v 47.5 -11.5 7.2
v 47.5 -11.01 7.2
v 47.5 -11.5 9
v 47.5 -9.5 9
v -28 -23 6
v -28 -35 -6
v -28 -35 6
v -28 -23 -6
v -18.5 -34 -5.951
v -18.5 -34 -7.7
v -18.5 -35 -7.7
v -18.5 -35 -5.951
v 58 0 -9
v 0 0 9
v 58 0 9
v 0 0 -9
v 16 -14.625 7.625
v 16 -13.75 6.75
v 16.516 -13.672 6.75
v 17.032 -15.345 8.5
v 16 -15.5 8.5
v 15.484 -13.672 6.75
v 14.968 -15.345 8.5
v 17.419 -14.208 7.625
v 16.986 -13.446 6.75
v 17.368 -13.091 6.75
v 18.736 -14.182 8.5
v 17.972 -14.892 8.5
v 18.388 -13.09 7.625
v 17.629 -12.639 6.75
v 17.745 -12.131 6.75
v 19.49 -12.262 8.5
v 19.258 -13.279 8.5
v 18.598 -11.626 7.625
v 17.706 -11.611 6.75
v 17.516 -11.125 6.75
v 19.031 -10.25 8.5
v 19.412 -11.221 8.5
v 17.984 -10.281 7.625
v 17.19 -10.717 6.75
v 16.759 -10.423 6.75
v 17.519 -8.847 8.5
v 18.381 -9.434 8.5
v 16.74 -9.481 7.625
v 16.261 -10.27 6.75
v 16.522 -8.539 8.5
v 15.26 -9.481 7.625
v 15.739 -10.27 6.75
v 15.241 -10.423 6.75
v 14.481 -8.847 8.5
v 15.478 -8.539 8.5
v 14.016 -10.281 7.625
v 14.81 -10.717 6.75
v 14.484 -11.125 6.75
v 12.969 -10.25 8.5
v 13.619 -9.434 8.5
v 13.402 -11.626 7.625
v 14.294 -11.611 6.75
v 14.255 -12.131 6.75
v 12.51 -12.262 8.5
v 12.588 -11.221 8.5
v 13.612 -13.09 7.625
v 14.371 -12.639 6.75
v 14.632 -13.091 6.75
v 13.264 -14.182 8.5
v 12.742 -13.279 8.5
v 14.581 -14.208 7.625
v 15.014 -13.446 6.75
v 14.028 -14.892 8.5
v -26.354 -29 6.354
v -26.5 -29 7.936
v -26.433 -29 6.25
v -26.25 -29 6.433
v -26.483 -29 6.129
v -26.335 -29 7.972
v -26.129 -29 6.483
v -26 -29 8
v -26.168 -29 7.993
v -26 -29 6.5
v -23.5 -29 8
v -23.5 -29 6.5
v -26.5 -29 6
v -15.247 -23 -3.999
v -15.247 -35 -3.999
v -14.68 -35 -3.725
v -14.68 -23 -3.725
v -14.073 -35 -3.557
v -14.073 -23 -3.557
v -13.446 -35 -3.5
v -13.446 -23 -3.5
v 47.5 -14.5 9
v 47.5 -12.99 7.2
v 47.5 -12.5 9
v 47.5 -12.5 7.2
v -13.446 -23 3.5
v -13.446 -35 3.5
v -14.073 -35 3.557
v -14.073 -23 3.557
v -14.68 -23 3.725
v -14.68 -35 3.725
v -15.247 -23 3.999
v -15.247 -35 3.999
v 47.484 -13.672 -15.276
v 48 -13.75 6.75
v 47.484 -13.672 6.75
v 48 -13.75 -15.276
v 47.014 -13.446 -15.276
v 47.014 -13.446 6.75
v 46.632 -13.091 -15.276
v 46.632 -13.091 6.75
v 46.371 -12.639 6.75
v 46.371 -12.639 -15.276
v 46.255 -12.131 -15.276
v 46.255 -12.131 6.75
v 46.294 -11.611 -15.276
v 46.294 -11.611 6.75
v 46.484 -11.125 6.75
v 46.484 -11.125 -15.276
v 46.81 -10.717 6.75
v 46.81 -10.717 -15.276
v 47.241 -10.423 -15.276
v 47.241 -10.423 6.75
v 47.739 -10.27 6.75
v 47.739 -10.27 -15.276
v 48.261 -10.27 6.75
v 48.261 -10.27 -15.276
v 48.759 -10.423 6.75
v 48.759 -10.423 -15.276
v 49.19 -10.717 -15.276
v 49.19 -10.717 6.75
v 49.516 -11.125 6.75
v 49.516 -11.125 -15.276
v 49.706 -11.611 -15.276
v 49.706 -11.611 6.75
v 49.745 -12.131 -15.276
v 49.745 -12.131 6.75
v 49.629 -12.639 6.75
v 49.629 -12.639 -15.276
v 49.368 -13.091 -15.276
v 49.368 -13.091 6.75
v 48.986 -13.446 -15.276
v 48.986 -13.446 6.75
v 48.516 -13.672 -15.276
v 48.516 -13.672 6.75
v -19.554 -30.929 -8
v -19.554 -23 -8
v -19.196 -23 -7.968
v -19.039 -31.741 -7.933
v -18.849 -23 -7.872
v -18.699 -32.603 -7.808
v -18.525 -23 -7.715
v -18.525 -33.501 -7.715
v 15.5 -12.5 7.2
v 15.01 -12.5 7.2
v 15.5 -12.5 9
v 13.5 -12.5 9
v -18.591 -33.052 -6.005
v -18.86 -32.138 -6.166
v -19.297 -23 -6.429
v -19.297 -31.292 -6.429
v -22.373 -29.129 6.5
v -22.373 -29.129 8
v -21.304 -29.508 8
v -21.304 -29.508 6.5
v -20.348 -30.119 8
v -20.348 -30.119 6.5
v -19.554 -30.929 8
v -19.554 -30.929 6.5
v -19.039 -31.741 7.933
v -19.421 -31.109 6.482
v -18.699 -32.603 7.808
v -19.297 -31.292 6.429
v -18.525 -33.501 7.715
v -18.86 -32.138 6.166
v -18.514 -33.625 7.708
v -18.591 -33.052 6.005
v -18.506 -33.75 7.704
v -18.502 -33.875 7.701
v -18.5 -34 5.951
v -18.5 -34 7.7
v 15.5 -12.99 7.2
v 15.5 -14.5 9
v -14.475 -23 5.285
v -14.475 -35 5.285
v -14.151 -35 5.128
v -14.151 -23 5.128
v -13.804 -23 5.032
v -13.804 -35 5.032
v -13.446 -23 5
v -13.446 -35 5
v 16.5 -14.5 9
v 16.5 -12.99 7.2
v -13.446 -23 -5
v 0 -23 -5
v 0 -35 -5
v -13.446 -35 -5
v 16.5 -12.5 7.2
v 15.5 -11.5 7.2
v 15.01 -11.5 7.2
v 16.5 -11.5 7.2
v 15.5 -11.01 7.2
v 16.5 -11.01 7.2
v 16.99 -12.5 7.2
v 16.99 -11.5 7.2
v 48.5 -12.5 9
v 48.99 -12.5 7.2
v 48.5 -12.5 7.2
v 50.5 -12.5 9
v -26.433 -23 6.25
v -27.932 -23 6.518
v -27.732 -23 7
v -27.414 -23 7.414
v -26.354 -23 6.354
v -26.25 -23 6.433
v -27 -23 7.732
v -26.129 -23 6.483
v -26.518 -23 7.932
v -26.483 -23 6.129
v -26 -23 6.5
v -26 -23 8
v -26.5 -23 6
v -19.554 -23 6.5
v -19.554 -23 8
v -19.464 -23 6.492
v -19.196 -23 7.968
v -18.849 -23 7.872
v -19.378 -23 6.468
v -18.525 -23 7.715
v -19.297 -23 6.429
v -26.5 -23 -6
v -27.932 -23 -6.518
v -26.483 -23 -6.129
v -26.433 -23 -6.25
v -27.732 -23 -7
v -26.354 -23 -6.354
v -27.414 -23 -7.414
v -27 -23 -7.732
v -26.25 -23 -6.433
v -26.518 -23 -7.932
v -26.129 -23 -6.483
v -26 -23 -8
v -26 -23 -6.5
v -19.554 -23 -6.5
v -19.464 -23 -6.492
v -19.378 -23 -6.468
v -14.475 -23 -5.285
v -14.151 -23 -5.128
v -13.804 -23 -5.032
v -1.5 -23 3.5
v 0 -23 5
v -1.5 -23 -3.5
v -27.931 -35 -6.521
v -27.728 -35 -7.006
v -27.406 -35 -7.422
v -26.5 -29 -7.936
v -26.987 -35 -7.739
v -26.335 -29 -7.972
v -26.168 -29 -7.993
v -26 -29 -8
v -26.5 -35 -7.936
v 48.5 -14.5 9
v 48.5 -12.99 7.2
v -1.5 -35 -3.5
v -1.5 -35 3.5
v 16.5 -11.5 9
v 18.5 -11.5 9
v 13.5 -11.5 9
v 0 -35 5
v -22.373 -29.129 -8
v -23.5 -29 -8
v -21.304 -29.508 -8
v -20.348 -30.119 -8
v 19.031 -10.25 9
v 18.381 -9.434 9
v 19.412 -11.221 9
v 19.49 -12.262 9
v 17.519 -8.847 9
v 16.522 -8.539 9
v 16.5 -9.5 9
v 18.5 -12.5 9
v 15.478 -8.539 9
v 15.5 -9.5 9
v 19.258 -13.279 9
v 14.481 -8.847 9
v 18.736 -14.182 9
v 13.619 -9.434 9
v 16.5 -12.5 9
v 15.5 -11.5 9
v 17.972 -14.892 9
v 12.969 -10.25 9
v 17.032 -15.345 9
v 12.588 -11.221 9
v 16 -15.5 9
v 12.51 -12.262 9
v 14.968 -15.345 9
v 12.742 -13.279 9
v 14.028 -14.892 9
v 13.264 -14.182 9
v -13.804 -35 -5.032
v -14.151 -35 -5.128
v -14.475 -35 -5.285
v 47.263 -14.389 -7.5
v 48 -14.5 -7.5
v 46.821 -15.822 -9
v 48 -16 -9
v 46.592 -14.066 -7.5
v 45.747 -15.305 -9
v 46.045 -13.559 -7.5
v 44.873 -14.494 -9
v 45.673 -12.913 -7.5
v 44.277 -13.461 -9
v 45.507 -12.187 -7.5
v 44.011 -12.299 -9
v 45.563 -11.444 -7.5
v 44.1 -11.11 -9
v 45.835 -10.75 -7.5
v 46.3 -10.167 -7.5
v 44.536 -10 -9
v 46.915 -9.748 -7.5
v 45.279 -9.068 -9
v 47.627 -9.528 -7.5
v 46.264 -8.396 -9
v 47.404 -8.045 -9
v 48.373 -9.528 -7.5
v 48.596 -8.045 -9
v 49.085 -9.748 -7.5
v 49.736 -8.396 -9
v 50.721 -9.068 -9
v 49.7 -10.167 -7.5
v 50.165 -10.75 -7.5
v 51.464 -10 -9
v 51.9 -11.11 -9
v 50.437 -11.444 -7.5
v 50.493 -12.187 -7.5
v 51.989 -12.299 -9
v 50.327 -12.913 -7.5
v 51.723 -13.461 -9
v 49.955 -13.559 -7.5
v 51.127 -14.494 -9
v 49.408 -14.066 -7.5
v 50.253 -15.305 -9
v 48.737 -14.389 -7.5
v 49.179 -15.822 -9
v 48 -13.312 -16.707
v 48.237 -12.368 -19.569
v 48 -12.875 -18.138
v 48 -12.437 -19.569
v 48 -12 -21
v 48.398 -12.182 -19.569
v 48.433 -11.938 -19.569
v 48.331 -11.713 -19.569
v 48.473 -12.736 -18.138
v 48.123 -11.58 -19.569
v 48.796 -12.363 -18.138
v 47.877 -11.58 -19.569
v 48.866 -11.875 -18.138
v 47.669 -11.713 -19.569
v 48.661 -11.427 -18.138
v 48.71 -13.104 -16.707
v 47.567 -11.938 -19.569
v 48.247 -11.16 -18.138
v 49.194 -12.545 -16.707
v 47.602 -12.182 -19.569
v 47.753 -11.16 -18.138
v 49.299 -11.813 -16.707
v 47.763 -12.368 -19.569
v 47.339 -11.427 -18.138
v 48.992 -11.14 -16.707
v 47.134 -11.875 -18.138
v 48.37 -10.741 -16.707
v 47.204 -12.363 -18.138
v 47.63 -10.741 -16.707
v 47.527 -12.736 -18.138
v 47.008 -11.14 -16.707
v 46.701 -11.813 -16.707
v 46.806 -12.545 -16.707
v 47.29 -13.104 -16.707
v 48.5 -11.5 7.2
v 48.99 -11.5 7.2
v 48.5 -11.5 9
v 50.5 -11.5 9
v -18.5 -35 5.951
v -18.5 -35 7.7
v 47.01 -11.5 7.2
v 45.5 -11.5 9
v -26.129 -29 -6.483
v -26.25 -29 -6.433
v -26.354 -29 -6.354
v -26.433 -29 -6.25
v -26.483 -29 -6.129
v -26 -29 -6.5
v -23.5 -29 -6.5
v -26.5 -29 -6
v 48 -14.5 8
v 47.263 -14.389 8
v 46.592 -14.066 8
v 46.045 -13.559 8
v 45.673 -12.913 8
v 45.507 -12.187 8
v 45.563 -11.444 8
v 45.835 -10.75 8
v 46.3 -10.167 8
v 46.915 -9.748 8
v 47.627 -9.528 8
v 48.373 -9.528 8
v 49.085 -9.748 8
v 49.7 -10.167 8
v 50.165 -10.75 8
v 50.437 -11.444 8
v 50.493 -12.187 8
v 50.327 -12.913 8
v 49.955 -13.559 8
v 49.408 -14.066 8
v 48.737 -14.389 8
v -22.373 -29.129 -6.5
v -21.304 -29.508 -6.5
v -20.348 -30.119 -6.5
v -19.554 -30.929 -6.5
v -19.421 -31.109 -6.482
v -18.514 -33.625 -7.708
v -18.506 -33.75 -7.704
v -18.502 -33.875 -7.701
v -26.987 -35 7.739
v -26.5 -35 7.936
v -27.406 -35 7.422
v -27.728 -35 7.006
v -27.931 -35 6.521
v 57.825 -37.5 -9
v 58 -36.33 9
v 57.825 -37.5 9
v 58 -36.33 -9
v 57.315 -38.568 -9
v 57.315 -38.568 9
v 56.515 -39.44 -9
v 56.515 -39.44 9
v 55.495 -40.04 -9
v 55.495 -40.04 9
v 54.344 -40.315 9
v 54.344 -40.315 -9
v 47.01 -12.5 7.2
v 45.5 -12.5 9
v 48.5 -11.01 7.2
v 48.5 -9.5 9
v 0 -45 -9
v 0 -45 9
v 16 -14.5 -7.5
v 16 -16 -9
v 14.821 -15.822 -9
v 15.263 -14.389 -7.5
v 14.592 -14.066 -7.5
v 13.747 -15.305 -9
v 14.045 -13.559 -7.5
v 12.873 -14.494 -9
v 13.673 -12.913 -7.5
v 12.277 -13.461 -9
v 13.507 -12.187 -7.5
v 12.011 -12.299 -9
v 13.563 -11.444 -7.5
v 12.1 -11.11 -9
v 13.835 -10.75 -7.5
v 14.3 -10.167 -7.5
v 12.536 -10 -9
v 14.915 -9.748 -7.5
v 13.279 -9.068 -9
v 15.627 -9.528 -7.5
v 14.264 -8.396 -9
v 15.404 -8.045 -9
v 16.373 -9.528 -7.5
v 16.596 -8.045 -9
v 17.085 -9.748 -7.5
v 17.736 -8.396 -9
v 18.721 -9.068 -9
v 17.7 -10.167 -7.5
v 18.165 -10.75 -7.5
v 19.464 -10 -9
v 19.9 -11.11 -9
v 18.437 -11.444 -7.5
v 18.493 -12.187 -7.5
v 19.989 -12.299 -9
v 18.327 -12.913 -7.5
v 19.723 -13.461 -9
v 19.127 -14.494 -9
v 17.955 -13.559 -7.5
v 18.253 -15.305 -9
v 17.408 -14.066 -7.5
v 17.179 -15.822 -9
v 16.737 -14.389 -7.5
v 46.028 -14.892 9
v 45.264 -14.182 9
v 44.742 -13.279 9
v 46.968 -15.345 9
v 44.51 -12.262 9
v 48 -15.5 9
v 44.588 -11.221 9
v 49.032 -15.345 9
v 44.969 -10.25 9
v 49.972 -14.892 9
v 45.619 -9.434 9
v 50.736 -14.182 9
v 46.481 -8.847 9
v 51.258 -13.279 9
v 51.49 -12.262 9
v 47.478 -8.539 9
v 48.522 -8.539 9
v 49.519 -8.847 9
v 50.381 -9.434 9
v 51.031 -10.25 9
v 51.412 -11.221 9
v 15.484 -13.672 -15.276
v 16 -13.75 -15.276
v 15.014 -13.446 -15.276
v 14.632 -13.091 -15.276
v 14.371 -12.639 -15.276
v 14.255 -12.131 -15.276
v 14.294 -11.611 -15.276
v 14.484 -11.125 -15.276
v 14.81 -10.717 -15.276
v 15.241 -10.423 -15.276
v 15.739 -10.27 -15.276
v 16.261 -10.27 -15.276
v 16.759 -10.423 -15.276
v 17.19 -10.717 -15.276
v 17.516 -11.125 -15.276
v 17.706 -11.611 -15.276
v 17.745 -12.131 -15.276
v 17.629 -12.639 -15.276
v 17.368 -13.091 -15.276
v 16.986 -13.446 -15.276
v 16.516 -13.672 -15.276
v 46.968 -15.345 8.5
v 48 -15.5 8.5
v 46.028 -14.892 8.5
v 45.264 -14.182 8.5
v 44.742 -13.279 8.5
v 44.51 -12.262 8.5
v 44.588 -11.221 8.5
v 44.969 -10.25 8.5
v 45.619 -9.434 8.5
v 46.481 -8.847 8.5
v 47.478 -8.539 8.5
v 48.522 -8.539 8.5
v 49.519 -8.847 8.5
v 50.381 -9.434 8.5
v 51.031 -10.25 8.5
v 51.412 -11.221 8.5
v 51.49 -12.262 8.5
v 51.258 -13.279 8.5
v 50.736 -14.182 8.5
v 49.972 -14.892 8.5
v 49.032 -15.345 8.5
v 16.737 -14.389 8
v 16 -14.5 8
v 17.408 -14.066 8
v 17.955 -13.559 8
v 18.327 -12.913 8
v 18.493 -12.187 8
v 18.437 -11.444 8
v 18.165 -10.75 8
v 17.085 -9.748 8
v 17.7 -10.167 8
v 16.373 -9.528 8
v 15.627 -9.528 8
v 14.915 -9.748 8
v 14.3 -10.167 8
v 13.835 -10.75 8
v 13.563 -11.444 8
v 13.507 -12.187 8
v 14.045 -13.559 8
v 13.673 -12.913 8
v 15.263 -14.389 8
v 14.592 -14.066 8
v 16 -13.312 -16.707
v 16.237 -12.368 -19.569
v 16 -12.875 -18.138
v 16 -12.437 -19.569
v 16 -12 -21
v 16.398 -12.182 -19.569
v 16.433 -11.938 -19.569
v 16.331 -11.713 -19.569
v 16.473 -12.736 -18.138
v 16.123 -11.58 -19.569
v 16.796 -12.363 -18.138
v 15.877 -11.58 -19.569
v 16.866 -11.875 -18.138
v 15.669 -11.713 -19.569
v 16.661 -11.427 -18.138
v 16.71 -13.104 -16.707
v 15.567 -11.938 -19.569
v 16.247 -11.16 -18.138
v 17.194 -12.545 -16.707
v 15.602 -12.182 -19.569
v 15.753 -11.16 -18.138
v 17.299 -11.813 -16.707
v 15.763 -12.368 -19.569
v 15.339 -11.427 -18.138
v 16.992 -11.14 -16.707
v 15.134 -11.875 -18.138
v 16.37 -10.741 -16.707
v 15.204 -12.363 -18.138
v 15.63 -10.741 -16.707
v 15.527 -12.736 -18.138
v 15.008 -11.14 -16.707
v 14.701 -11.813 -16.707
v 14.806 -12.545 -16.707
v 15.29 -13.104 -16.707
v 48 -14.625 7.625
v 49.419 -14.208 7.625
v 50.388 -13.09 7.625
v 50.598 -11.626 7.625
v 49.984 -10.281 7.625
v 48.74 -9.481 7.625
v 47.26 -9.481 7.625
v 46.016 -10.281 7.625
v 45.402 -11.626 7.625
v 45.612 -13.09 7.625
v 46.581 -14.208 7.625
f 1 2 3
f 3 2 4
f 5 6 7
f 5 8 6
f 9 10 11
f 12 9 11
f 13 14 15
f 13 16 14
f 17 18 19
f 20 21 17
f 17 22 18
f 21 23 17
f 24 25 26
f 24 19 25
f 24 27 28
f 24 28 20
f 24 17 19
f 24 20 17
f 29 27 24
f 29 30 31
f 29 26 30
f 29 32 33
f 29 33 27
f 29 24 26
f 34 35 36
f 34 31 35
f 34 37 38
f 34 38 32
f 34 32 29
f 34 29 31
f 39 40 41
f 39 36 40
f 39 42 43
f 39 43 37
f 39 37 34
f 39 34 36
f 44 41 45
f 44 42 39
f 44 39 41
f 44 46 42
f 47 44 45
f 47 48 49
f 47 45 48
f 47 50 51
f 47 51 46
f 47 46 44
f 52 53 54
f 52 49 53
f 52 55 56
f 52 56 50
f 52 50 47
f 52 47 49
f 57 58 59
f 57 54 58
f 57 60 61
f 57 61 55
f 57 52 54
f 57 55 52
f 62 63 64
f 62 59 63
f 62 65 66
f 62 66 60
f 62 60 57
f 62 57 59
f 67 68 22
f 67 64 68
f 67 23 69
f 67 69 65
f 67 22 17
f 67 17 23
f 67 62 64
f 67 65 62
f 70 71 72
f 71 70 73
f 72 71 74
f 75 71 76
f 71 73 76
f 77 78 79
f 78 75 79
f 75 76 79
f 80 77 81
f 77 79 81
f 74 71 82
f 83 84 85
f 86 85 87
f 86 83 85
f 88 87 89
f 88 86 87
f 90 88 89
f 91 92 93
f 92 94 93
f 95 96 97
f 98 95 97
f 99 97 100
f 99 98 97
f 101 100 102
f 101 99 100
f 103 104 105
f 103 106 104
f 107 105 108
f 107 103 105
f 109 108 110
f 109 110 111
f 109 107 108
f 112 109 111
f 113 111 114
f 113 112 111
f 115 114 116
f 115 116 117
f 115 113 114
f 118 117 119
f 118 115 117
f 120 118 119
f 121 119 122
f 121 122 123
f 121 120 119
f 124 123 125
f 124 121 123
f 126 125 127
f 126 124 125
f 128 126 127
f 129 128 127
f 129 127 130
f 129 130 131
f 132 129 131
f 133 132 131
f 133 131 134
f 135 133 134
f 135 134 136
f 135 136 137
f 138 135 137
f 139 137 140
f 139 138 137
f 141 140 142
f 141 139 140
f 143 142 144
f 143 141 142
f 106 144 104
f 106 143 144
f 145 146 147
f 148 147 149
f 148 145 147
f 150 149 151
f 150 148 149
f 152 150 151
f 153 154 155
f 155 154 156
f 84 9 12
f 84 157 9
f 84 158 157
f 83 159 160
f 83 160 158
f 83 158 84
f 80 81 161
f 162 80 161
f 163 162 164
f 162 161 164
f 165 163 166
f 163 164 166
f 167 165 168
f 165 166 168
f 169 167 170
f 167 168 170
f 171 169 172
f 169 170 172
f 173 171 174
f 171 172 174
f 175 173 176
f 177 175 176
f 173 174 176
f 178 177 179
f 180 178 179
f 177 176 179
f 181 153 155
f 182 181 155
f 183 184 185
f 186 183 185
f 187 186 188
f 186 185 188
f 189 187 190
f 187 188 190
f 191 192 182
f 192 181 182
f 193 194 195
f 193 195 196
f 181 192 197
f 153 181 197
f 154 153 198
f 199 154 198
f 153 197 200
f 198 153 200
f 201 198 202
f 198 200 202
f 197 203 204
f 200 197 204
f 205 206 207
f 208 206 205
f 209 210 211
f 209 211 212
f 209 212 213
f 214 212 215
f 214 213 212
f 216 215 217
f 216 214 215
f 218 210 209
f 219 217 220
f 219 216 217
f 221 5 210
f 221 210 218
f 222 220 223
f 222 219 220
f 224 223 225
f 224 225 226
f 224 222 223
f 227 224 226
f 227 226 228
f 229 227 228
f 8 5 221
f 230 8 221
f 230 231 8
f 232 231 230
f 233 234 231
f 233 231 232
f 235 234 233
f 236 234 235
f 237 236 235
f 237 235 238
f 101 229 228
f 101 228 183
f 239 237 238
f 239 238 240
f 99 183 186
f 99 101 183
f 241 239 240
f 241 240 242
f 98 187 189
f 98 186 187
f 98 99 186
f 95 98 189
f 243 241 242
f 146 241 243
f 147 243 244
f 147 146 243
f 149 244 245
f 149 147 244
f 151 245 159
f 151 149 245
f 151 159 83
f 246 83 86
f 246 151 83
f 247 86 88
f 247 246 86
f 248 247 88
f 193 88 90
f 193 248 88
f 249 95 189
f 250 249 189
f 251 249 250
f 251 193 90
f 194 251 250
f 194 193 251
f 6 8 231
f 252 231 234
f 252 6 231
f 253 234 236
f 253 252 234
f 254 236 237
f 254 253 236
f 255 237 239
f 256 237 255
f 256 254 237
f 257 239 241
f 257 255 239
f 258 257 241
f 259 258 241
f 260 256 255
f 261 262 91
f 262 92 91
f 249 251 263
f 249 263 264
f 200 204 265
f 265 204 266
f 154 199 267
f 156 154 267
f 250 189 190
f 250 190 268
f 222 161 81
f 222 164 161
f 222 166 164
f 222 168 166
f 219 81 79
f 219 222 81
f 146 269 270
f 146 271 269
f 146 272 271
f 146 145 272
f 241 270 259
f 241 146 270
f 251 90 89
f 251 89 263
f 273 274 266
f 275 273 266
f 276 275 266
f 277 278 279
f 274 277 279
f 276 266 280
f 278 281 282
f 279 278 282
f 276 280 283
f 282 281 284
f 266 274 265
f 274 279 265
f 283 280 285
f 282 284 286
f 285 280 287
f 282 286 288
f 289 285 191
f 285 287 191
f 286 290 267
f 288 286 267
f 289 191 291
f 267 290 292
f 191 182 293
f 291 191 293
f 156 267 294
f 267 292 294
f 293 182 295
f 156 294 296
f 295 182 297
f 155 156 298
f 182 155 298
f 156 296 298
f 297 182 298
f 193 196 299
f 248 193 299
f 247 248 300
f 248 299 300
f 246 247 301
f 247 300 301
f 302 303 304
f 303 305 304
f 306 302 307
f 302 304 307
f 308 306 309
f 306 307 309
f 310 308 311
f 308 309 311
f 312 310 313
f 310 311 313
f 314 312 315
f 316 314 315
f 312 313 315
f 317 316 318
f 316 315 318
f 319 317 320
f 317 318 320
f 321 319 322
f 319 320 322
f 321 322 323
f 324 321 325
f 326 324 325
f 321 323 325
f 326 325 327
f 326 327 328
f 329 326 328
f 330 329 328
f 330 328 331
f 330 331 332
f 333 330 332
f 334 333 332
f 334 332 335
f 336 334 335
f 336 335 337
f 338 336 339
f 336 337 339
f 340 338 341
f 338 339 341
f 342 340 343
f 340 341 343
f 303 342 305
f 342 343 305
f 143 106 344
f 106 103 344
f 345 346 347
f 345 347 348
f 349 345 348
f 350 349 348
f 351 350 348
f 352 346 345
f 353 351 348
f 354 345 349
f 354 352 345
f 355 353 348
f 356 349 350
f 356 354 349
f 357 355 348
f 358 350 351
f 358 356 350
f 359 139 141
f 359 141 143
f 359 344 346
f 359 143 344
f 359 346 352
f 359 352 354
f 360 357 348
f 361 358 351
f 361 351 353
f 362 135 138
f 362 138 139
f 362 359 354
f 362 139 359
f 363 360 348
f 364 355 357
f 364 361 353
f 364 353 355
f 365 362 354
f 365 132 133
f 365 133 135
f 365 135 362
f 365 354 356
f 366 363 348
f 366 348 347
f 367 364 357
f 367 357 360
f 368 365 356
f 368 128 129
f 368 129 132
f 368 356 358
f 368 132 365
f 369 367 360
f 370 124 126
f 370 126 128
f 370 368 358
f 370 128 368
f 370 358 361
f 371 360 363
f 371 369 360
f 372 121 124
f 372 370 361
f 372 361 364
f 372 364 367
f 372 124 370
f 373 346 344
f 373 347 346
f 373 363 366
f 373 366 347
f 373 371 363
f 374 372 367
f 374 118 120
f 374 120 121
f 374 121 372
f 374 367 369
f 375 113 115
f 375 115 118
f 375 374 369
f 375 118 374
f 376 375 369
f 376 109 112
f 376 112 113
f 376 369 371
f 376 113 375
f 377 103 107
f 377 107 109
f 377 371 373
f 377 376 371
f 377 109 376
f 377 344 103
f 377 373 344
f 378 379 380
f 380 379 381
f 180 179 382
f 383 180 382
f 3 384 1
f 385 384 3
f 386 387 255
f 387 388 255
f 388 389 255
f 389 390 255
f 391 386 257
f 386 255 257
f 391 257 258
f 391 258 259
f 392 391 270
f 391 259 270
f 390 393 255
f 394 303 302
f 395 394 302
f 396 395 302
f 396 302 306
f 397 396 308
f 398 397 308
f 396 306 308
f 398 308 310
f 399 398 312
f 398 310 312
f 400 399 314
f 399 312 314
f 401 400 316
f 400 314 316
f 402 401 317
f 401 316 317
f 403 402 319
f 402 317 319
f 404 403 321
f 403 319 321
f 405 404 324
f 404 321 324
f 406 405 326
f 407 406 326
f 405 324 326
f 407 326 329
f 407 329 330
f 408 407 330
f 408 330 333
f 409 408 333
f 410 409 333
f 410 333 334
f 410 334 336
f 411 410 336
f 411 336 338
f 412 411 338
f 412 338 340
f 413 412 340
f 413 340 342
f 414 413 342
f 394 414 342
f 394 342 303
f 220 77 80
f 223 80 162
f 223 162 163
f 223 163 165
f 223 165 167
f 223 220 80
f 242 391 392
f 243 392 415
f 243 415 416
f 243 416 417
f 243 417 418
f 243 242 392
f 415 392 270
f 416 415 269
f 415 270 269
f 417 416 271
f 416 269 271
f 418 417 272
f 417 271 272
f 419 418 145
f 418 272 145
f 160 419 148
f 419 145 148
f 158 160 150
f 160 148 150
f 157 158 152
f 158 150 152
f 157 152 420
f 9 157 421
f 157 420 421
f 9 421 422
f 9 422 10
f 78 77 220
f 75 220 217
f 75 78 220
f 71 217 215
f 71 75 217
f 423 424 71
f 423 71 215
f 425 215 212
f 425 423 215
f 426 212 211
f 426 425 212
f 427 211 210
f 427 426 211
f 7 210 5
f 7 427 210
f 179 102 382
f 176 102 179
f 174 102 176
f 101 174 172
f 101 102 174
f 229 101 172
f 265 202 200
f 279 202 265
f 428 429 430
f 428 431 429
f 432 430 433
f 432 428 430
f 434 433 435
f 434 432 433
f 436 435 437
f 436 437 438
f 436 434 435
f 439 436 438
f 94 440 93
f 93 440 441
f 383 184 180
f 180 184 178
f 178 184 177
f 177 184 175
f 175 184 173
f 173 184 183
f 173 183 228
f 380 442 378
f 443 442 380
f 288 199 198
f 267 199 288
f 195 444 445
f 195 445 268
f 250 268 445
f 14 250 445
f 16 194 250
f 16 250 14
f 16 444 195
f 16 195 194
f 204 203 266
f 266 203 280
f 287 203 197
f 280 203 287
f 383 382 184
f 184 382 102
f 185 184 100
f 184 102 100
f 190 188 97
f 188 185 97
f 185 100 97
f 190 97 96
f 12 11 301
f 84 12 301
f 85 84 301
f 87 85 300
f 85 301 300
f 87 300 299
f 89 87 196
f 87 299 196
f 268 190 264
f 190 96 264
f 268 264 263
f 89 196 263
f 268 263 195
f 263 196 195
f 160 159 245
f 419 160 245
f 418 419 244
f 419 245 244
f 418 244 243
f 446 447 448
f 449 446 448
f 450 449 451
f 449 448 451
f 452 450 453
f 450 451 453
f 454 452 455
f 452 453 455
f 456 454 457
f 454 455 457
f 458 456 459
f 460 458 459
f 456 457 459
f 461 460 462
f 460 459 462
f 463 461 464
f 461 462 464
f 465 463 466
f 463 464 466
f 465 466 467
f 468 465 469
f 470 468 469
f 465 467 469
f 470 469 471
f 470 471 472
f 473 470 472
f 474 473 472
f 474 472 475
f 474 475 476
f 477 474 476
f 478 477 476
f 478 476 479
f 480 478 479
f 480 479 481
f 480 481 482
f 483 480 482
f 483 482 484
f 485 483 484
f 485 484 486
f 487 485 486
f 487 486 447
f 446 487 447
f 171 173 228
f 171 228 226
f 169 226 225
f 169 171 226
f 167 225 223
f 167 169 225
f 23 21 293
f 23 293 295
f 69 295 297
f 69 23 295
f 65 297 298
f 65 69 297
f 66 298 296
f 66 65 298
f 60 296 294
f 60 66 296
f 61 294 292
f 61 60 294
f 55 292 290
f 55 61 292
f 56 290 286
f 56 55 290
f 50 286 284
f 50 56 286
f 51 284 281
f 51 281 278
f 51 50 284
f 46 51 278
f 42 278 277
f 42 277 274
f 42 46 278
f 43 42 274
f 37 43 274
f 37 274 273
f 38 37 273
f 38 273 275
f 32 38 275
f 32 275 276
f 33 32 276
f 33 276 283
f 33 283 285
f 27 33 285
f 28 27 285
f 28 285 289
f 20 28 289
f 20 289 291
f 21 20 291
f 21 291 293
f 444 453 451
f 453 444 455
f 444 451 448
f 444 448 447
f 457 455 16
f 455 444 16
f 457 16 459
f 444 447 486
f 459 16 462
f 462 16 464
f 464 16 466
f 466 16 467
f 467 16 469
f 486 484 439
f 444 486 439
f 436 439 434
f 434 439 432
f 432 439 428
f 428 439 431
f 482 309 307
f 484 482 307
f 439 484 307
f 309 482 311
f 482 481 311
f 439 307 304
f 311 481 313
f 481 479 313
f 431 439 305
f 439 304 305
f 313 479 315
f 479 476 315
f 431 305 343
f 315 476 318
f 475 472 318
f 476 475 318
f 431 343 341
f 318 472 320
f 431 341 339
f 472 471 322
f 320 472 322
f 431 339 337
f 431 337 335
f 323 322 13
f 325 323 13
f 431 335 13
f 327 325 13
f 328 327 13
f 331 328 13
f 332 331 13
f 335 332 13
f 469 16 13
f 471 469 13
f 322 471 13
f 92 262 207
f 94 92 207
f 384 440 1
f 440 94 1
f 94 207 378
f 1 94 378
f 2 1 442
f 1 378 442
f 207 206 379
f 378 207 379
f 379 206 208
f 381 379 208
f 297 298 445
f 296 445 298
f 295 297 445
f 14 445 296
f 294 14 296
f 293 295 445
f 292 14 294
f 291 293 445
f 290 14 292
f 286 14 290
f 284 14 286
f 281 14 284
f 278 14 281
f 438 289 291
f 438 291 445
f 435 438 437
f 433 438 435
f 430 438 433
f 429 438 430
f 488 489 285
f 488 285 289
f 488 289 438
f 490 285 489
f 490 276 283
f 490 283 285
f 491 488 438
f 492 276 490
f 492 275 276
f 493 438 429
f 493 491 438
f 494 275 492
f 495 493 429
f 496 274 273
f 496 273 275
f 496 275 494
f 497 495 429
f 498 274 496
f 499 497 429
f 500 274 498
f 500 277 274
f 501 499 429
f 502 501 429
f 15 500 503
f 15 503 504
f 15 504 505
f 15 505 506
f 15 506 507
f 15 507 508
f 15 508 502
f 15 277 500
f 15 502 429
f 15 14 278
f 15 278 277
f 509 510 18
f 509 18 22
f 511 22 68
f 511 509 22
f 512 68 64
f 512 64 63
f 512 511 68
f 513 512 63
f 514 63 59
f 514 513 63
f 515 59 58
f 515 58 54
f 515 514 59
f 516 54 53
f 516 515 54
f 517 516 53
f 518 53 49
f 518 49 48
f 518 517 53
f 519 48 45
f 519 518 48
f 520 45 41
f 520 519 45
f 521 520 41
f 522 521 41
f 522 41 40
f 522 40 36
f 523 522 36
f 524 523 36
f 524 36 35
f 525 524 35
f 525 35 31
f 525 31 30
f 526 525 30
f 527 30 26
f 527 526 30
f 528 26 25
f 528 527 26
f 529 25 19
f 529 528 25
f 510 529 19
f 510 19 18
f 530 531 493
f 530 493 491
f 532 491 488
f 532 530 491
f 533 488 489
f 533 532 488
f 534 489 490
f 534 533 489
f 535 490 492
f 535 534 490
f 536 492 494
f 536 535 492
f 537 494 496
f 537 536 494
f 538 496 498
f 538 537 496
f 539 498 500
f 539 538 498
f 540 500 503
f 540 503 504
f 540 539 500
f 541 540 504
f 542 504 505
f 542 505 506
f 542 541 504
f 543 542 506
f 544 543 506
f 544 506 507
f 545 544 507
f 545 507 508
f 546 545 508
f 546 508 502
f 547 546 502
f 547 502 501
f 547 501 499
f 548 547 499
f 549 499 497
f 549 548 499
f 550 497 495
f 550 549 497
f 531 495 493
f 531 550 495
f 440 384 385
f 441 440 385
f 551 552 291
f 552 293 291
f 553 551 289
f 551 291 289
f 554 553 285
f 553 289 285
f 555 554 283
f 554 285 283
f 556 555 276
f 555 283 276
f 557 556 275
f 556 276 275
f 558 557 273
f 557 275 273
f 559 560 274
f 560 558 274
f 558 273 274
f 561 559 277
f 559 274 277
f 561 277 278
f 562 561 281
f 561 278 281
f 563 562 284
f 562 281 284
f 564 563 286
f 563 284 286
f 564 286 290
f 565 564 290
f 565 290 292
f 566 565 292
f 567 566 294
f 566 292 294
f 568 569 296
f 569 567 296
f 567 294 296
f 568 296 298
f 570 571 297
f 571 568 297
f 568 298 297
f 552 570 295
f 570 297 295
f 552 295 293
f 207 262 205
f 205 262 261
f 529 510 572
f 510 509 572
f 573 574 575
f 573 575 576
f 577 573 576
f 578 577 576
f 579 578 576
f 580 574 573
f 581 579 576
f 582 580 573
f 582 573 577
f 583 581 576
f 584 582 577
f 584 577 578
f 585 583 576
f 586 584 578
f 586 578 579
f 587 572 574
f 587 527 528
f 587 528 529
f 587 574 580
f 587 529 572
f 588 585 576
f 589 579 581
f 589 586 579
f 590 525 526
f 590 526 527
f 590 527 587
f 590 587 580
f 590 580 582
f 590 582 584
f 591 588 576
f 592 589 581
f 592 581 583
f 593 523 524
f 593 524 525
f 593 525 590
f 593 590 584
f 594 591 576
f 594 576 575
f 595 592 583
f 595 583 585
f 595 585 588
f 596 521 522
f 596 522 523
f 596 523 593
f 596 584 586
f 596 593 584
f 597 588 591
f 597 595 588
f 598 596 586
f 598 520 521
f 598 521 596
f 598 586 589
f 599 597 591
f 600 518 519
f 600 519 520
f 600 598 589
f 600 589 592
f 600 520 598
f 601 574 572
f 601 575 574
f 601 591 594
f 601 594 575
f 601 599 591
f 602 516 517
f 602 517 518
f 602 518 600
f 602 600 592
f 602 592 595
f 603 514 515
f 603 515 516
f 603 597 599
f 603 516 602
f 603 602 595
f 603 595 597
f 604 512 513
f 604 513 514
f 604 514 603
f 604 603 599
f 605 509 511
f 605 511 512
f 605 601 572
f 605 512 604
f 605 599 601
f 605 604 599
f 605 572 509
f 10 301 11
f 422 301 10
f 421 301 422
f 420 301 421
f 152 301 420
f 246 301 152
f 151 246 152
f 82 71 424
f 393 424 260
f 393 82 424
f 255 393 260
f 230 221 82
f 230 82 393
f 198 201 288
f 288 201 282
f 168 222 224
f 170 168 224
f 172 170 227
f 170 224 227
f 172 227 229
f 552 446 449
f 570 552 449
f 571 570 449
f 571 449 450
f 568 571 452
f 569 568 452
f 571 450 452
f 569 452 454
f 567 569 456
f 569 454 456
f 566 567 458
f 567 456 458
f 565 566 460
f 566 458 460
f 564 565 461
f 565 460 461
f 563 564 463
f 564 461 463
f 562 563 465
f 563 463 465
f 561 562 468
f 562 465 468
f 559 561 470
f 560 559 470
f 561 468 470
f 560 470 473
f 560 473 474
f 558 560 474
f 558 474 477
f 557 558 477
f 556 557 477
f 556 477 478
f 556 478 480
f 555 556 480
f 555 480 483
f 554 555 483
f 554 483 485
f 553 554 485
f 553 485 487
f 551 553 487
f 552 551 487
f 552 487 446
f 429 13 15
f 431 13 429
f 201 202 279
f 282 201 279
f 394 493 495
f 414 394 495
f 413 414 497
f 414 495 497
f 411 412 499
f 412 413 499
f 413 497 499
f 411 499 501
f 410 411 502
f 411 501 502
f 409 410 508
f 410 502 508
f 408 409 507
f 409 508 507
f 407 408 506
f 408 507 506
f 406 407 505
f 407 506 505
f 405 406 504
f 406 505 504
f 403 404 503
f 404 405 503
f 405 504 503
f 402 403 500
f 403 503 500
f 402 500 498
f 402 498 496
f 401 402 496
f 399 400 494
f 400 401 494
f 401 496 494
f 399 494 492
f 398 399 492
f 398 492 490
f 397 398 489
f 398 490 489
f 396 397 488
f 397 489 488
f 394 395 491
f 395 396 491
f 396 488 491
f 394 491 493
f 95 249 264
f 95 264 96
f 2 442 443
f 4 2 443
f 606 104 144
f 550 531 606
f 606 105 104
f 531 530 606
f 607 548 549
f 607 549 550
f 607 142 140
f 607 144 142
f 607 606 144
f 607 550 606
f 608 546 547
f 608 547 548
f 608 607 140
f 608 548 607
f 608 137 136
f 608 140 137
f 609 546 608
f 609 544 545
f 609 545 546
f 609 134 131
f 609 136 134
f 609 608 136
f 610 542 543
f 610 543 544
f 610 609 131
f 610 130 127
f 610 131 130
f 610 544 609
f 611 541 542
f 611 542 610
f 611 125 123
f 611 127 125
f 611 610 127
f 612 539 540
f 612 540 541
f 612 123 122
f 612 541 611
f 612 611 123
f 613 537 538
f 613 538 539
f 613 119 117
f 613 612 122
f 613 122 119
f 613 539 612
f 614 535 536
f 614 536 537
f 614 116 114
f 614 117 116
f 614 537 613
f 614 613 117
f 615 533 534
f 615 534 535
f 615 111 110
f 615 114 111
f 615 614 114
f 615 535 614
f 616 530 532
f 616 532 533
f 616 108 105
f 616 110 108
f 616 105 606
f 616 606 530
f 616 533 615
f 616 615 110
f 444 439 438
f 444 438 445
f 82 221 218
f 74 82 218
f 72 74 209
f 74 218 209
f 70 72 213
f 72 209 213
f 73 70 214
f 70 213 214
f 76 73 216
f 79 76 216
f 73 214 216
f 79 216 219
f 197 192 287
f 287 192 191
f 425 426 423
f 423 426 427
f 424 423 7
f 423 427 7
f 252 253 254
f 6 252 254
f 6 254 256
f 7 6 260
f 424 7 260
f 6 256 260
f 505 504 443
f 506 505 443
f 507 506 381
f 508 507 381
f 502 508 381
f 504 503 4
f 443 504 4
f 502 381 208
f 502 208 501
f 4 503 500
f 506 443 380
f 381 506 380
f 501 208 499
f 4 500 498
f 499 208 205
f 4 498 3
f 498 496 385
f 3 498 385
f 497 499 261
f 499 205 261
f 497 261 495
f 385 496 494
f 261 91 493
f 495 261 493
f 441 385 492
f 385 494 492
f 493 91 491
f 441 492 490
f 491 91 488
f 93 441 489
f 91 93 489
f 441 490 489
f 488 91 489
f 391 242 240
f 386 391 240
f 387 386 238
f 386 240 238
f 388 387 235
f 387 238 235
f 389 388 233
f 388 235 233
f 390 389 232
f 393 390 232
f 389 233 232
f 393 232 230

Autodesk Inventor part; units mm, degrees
ref_plane "YZ Plane" through (0, 0, 0) normal (1, 0, 0) x (0, 1, 0)
sketch "Sketch1" plane through (0, 0, 0) normal (0, 0, 1) x (1, 0, 0)
  line L0 (0, 0) -> (58, 0)
  line L1 (58, 0) -> (58, -40)
  line L2 (58, -40) -> (0, -45)
  line L3 (0, -45) -> (0, 0)
  dimension "d0" = 45
  dimension "d1" = 58
  dimension "d2" = 40
extrude "Extrusion1" add sketch "Sketch1" along normal mid plane 18
ref_plane "Work Plane1" through (0, -23, -9) normal (0, 1, 0) x (1, 0, 0)
sketch "Sketch2" plane through (0, -23, -9) normal (0, 1, 0) x (1, 0, 0)
  line L0 (0, -4) -> (-14, -4)
  line L1 (-14, -4) -> (-14, -14)
  line L2 (-14, -14) -> (0, -14)
  line L3 (0, -14) -> (0, -4)
  line L4 (-19, -1) -> (-28, -1)
  line L5 (-28, -1) -> (-28, -17)
  line L6 (-28, -17) -> (-19, -17)
  line L7 (-19, -17) -> (-19, -1)
  line L8 (-14, -4) -> (-19, -1)
  line L9 (-14, -14) -> (-19, -17)
  line L10 (0, 0) -> (0, -18) projected
  point P0 (0, -9)
  point P1 (0, -9)
  point P2 (-28, -9)
  point P3 (0, -9)
  dimension "d181" = 90
  dimension "d6" = 14
  dimension "d8" = 16
  dimension "d9" = 10
  dimension "d10" = 9
  dimension "d40" = 5
extrude "Extrusion2" add sketch "Sketch2" against normal blind 12
fillet "Fillet1" radius 2 6 edges at (-28, -29, -8) (-28, -29, 8) (-19, -29, -8) (-14, -29, -5) (-14, -29, 5) (-19, -29, 8)
sketch "Sketch5" plane through (0, -23, -9) normal (0, 1, 0) x (1, 0, 0)
  arc A0 (-19.554, -17) -> (-18.525, -16.715) centre (-19.554, -15) ccw projected
  line L0 (-18.525, -16.715) -> (-14.475, -14.285) projected
  arc A1 (-13.446, -14) -> (-14.475, -14.285) centre (-13.446, -16) ccw projected
  line L1 (-13.446, -14) -> (0, -14) projected
  line L2 (0, -4) -> (0, -14) projected
  line L3 (0, -4) -> (-13.446, -4) projected
  arc A2 (-14.475, -3.715) -> (-13.446, -4) centre (-13.446, -2) ccw projected
  line L4 (-14.475, -3.715) -> (-18.525, -1.285) projected
  arc A3 (-18.525, -1.285) -> (-19.554, -1) centre (-19.554, -3) ccw projected
  line L5 (-19.554, -1) -> (-26, -1) projected
  arc A4 (-26, -1) -> (-28, -3) centre (-26, -3) ccw projected
  line L6 (-28, -3) -> (-28, -15) projected
  arc A5 (-28, -15) -> (-26, -17) centre (-26, -15) ccw projected
  line L7 (-26, -17) -> (-19.554, -17) projected
  line L8 (-26, -2.5) -> (-19.554, -2.5)
  arc A6 (-19.2967, -2.5713) -> (-19.554, -2.5) centre (-19.554, -3) ccw
  line L9 (-19.2967, -2.5713) -> (-15.2468, -5.0012)
  arc A7 (-15.2468, -5.0012) -> (-13.446, -5.5) centre (-13.446, -2) ccw
  line L10 (-13.446, -5.5) -> (-1.5, -5.5)
  line L11 (-1.5, -5.5) -> (-1.5, -12.5)
  line L12 (-1.5, -12.5) -> (-13.446, -12.5)
  arc A8 (-13.446, -12.5) -> (-15.2468, -12.9988) centre (-13.446, -16) ccw
  line L13 (-15.2468, -12.9988) -> (-19.2967, -15.4287)
  arc A9 (-19.554, -15.5) -> (-19.2967, -15.4287) centre (-19.554, -15) ccw
  line L14 (-19.554, -15.5) -> (-26, -15.5)
  arc A10 (-26.5, -15) -> (-26, -15.5) centre (-26, -15) ccw
  line L15 (-26.5, -15) -> (-26.5, -3)
  arc A11 (-26, -2.5) -> (-26.5, -3) centre (-26, -3) ccw
  point P0 (0, -9)
  dimension "d18" = 1.5
extrude "Extrusion4" cut sketch "Sketch5" against normal through all contours L8 A6 L9 A7 L10 L11 L12 A8 L13 A9 L14 A10 L15 A11
sketch "Sketch4" plane through (0, 0, 0) normal (0, 0, 1) x (1, 0, 0)
  line L0 (-26.5, -23) -> (-26.5, -35) projected
  line L1 (-26.5, -29) -> (-23.5, -29)
  arc A0 (-18.5, -34) -> (-23.5, -29) centre (-23.5, -34) ccw
  line L2 (-18.5, -34) -> (-18.5, -35)
  line L3 (-18.5, -35) -> (-26.5, -35)
  line L4 (-26.5, -35) -> (-26.5, -29)
  line L5 (-26, -23) -> (-19.554, -23) projected
  point P0 (0, 0)
  dimension "d21" = 6
  dimension "d22" = 8
  dimension "d23" = 5
extrude "Extrusion5" cut sketch "Sketch4" along normal through all both and the other way through all
sketch "Sketch6" plane through (0, 0, 9) normal (0, 0, 1) x (1, 0, 0)
  line L0 (0, 0) -> (58, 0) projected
  line L1 (0, -45) -> (0, 0) projected
  line L2 (16, -12) -> (48, -12)
  dimension "d26" = 12
  dimension "d27" = 32
  dimension "d28" = 16
hole "Hole1" at (16, -12, 9) at (48, -12, 9) direction (0, 0, -1) diameter 5 end through all countersink diameter 7 countersink angle 90
chamfer "Chamfer1" distance 1.5 angle 45 2 edges at (16, -9.5, -9) (48, -9.5, -9)
fillet "Fillet2" radius 4 1 edges at (58, -40, 0)
ref_plane "Work Plane2" through (16, -12, -89.7168) normal (-1, 0, 0) x (0, 0, 1)
sketch "Sketch7" plane through (16, -12, -89.7168) normal (-1, 0, 0) x (0, 0, 1)
  line L0 (98.7168, 3.5) -> (98.7168, -3.5) projected
  line L1 (98.7168, -4.2) -> (98.7168, 0.7) construction
  line L2 (102.1168, 0) -> (68.7168, 0)
  line L3 (98.7168, 0) -> (98.7168, -3.5)
  line L4 (98.7168, -3.5) -> (98.2168, -3.5)
  line L5 (98.2168, -3.5) -> (96.4668, -1.75)
  line L6 (96.4668, -1.75) -> (74.4408, -1.75)
  line L7 (74.4408, -1.75) -> (68.7168, 0)
  point P0 (89.7168, 12)
  point P1 (74.4408, 0)
  dimension "d42" = 3.5
  dimension "d43" = 7
  dimension "d44" = 0.5
  dimension "d45" = 45
  dimension "d46" = 30
  dimension "d47" = 17
  dimension "d48" = 22.026
revolve "Revolution1" add sketch "Sketch7" angle 360 about axis through (16, -12, 12.4) along (0, 0, -1) separate body
sketch "Sketch8" plane through (16, -12, -89.7168) normal (-1, 0, 0) x (0, 0, 1)
  line L0 (98.7168, 3.5) -> (98.7168, -3.5) projected
  line L1 (96.5568, 0) -> (99.0768, 0)
  line L2 (96.9168, 0) -> (96.9168, 0.9896)
  line L3 (96.9168, 0.9896) -> (98.7168, 2.5)
  line L4 (98.7168, 2.5) -> (98.7168, 0)
  line L5 (98.7168, 3.5) -> (98.7168, -3.5)
  point P0 (89.7168, 12)
  dimension "d50" = 40
  dimension "d51" = 1.8
  dimension "d52" = 2.5
extrude "Extrusion6" cut sketch "Sketch8" along normal mid plane 1 bodies 2
pattern_circular "Circular Pattern1" count 4 over 360 about axis through (16, -12, -4.263) along (0, 0, -1) of "Extrusion6" bodies 2
thread "Thread1" size "M4x0.7" class "6g" standard "ANSI Metric M Profile" full length
pattern_linear "Rectangular Pattern1" count 2 spacing 32 along (1, 0, 0) bodies 2
sketch "Sketch9" plane through (16, -12, -89.7168) normal (-1, 0, 0) x (0, 0, 1)
  line L0 (80.7168, -3.5) -> (80.7168, 3.5)
  line L1 (80.7168, 4.2) -> (80.7168, -0.7) construction
  line L2 (77.3168, 0) -> (110.7168, 0)
  line L3 (80.7168, 0) -> (80.7168, 3.5)
  line L4 (80.7168, 3.5) -> (81.2168, 3.5)
  line L5 (81.2168, 3.5) -> (82.9668, 1.75)
  line L6 (82.9668, 1.75) -> (104.9928, 1.75)
  line L7 (104.9928, 1.75) -> (110.7168, 0)
  line L8 (80.7168, 4) -> (80.7168, -4) projected
  point P0 (89.7168, 12)
  point P1 (89.7168, 12)
  point P2 (104.9928, 0)
  point P3 (80.7168, 0)
  dimension "d64" = 3.5
  dimension "d65" = 7
  dimension "d66" = 0.5
  dimension "d67" = 45
  dimension "d68" = 30
  dimension "d69" = 17
  dimension "d70" = 22.026
revolve "Revolution2" [suppressed]
sketch "Sketch10" plane through (16, -12, -89.7168) normal (-1, 0, 0) x (0, 0, 1)
  line L0 (82.8768, 0) -> (80.3568, 0)
  line L1 (82.5168, 0) -> (82.5168, -0.9896)
  line L2 (82.5168, -0.9896) -> (80.7168, -2.5)
  line L3 (80.7168, -2.5) -> (80.7168, 0)
  line L4 (80.7168, -3.5) -> (80.7168, 3.5) projected
  point P0 (89.7168, 12)
  point P1 (80.7168, -3.5)
  point P2 (80.7168, 0)
  point P3 (80.7168, -3.5)
  dimension "d72" = 40
  dimension "d73" = 1.8
  dimension "d74" = 2.5
extrude "Extrusion7" [suppressed]
pattern_circular "Circular Pattern2" [suppressed]
thread "Thread2" size "M4x0.7" class "6g" standard "ANSI Metric M Profile" full length
pattern_linear "Rectangular Pattern2" [suppressed]
sketch "Sketch11" plane through (0, 0, 0) normal (0, 0, 1) x (1, 0, 0)
  line L0 (-30.5, -54) -> (-30.5, -41)
  arc A0 (-28.5, -39) -> (-30.5, -41) centre (-28.5, -41) ccw
  arc A1 (-28.5, -39) -> (-24.5, -35) centre (-28.5, -35) ccw
  line L1 (-24.5, -35) -> (-24.5, -27)
  line L2 (-24.5, -27) -> (-26.5, -27)
  line L3 (-26.5, -27) -> (-26.5, -35)
  arc A2 (-28.5, -37) -> (-26.5, -35) centre (-28.5, -35) ccw
  arc A3 (-28.5, -37) -> (-32.5, -41) centre (-28.5, -41) ccw
  line L4 (-32.5, -41) -> (-32.5, -54)
  arc A4 (-32.5, -54) -> (-28.5, -58) centre (-28.5, -54) ccw
  line L5 (-28.5, -58) -> (-26.5, -58)
  line L6 (-26.5, -58) -> (-26.5, -56)
  line L7 (-26.5, -56) -> (-28.5, -56)
  arc A5 (-30.5, -54) -> (-28.5, -56) centre (-28.5, -54) ccw
  line L8 (-28, -23) -> (-28, -35) projected
  line L9 (-26, -23) -> (-19.554, -23) projected
  point P0 (0, 0)
  point P1 (-32.5, -37)
  point P2 (-26.5, -27)
  dimension "d86" = 1.5
  dimension "d87" = 4
extrude "Extrusion8" [suppressed]
sketch "Sketch12" plane through (-24.5, -35, 9) normal (1, 0, 0) x (0, 0, -1)
  line L0 (0, 8) -> (125, 8) projected
  line L1 (125, 8) -> (125, 0) projected
  line L2 (3, 8) -> (122, 8)
  line L3 (122, 8) -> (122, 6)
  line L4 (122, 6) -> (3, 6)
  line L5 (3, 6) -> (3, 8)
  line L6 (0, -23) -> (125, -23) projected
  line L7 (122, 8) -> (120, 6)
  line L8 (3, 8) -> (5, 6)
  point P0 (9, 35)
  point P1 (62.5, 8)
  point P2 (62.5, -23)
  point P3 (62.5, 6)
  dimension "d92" = 2
  dimension "d93" = 3
  dimension "d94" = 2
  dimension "d95" = 2
extrude "Extrusion9" [suppressed]
sketch "Sketch14" plane through (-30.5, -54, 9) normal (1, 0, 0) x (0, 0, -1)
  line L0 (0, 0) -> (0, 13) projected
  line L1 (125, 13) -> (125, 0) projected
  line L2 (62.5, -3.9613) -> (62.5, 48.6353) construction
  line L3 (0, -4) -> (125, -4) projected
  line L4 (0, 13) -> (0, 0)
  line L5 (49.5, 10.5) -> (39.5, 10.5)
  line L6 (39.5, 2.5) -> (49.5, 2.5)
  arc A0 (39.5, 10.5) -> (39.5, 2.5) centre (39.5, 6.5) ccw
  arc A1 (49.5, 2.5) -> (49.5, 10.5) centre (49.5, 6.5) ccw
  line L7 (35.5, 10.5) -> (53.5, 10.5) construction
  line L8 (53.5, 10.5) -> (53.5, 2.5) construction
  line L9 (53.5, 2.5) -> (35.5, 2.5) construction
  line L10 (35.5, 2.5) -> (35.5, 10.5) construction
  line L11 (62.5, -17.1) -> (62.5, 26.3) construction
  circle A2 centre (28.5, 6.5) radius 3
  line L12 (28.5, 6.5) -> (28.5, 32.5416) construction
  line L13 (21.5, 2.5) -> (21.5, 10.5) construction
  arc A3 (17.5, 2.5) -> (17.5, 10.5) centre (17.5, 6.5) ccw
  line L14 (7.5, 10.5) -> (17.5, 10.5)
  line L15 (3.5, 10.5) -> (3.5, 2.5) construction
  line L16 (21.5, 10.5) -> (3.5, 10.5) construction
  line L17 (3.5, 2.5) -> (21.5, 2.5) construction
  arc A4 (7.5, 10.5) -> (7.5, 2.5) centre (7.5, 6.5) ccw
  line L18 (17.5, 2.5) -> (7.5, 2.5)
  line L19 (71.5, 10.5) -> (71.5, 2.5) construction
  arc A5 (75.5, 10.5) -> (75.5, 2.5) centre (75.5, 6.5) ccw
  line L20 (75.5, 10.5) -> (85.5, 10.5)
  line L21 (85.5, 2.5) -> (75.5, 2.5)
  line L22 (89.5, 10.5) -> (71.5, 10.5) construction
  line L23 (71.5, 2.5) -> (89.5, 2.5) construction
  arc A6 (85.5, 2.5) -> (85.5, 10.5) centre (85.5, 6.5) ccw
  line L24 (89.5, 2.5) -> (89.5, 10.5) construction
  circle A7 centre (96.5, 6.5) radius 3
  line L25 (107.5, 2.5) -> (117.5, 2.5)
  line L26 (117.5, 10.5) -> (107.5, 10.5)
  line L27 (121.5, 2.5) -> (103.5, 2.5) construction
  arc A8 (117.5, 2.5) -> (117.5, 10.5) centre (117.5, 6.5) ccw
  line L28 (103.5, 10.5) -> (121.5, 10.5) construction
  line L29 (103.5, 2.5) -> (103.5, 10.5) construction
  arc A9 (107.5, 10.5) -> (107.5, 2.5) centre (107.5, 6.5) ccw
  line L30 (121.5, 10.5) -> (121.5, 2.5) construction
  point P0 (9, 54)
  point P1 (117.5, 6.5)
  point P2 (62.5, -4)
  point P3 (0, 6.5)
  dimension "d105" = 10.5
  dimension "d106" = 7.5
  dimension "d107" = 18
  dimension "d108" = 8
  dimension "d109" = 18
  dimension "d110" = 6
  dimension "d111" = 7
  dimension "d112" = 7.5
  dimension "d113" = 10.5
extrude "Extrusion10" [suppressed]
ref_plane "Work Plane4" through (-32.5, -47.5, -19.5) normal (0, 0, -1) x (1, 0, 0)
revolve "Revolution3" [suppressed]
sketch "Sketch16" plane through (-32.5, -47.5, -19.5) normal (0, 0, -1) x (1, 0, 0)
  line L0 (2, 5) -> (2, -5) projected
  line L1 (-0.16, 0) -> (2.36, 0)
  line L2 (0.2, 0) -> (0.2, 2.4896)
  line L3 (0.2, 2.4896) -> (2, 4)
  line L4 (2, 4) -> (2, 0)
  line L5 (2, 5) -> (2, -5)
  point P0 (32.5, -47.5)
  dimension "d125" = 40
  dimension "d126" = 1.8
  dimension "d127" = 4
extrude "Extrusion11" [suppressed]
pattern_circular "Circular Pattern3" [suppressed]
thread "Thread3" size "M5x0.8" class "6g" standard "ANSI Metric M Profile" length 35
pattern_linear "Rectangular Pattern3" [suppressed]
extrude "Extrusion12" [suppressed]
sketch "Sketch17" plane through (-24.5, -35, 116) normal (1, 0, 0) x (0, 0, -1)
  line L0 (0, 8) -> (125, 8) projected
  line L1 (0, 0) -> (0, 8) projected
  line L2 (125, 8) -> (125, 0) projected
  line L3 (3, 8) -> (122, 8)
  line L4 (122, 8) -> (122, 6)
  line L5 (122, 6) -> (3, 6)
  line L6 (3, 6) -> (3, 8)
  line L7 (122, 8) -> (120, 6)
  line L8 (3, 8) -> (5, 6)
  point P0 (116, 35)
  dimension "d143" = 3
  dimension "d144" = 2
  dimension "d145" = 2
  dimension "d146" = 2
  dimension "d147" = 3
extrude "Extrusion13" [suppressed]
sketch "Sketch18" plane through (-30.5, -54, 116) normal (1, 0, 0) x (0, 0, -1)
  line L0 (0, 0) -> (0, 13) projected
  line L1 (0, -4) -> (125, -4) projected
  line L2 (0, 13) -> (0, 0)
  line L3 (49.5, 10.5) -> (39.5, 10.5)
  line L4 (39.5, 2.5) -> (49.5, 2.5)
  arc A0 (39.5, 10.5) -> (39.5, 2.5) centre (39.5, 6.5) ccw
  arc A1 (49.5, 2.5) -> (49.5, 10.5) centre (49.5, 6.5) ccw
  line L5 (35.5, 10.5) -> (53.5, 10.5) construction
  line L6 (53.5, 10.5) -> (53.5, 2.5) construction
  line L7 (53.5, 2.5) -> (35.5, 2.5) construction
  line L8 (35.5, 2.5) -> (35.5, 10.5) construction
  line L9 (62.5, -17.1) -> (62.5, 26.3) construction
  circle A2 centre (28.5, 6.5) radius 3
  line L10 (28.5, 6.5) -> (28.5, 32.5416) construction
  line L11 (21.5, 2.5) -> (21.5, 10.5) construction
  arc A3 (17.5, 2.5) -> (17.5, 10.5) centre (17.5, 6.5) ccw
  line L12 (7.5, 10.5) -> (17.5, 10.5)
  line L13 (3.5, 10.5) -> (3.5, 2.5) construction
  line L14 (21.5, 10.5) -> (3.5, 10.5) construction
  line L15 (3.5, 2.5) -> (21.5, 2.5) construction
  arc A4 (7.5, 10.5) -> (7.5, 2.5) centre (7.5, 6.5) ccw
  line L16 (17.5, 2.5) -> (7.5, 2.5)
  line L17 (89.5, 2.5) -> (89.5, 10.5) construction
  circle A5 centre (96.5, 6.5) radius 3
  line L18 (103.5, 2.5) -> (103.5, 10.5) construction
  arc A6 (107.5, 10.5) -> (107.5, 2.5) centre (107.5, 6.5) ccw
  line L19 (117.5, 10.5) -> (107.5, 10.5)
  line L20 (107.5, 2.5) -> (117.5, 2.5)
  line L21 (103.5, 10.5) -> (121.5, 10.5) construction
  line L22 (121.5, 2.5) -> (103.5, 2.5) construction
  arc A7 (117.5, 2.5) -> (117.5, 10.5) centre (117.5, 6.5) ccw
  line L23 (121.5, 10.5) -> (121.5, 2.5) construction
  line L24 (75.5, 10.5) -> (85.5, 10.5)
  line L25 (85.5, 2.5) -> (75.5, 2.5)
  arc A8 (85.5, 2.5) -> (85.5, 10.5) centre (85.5, 6.5) ccw
  arc A9 (75.5, 10.5) -> (75.5, 2.5) centre (75.5, 6.5) ccw
  line L26 (89.5, 10.5) -> (71.5, 10.5) construction
  line L27 (71.5, 10.5) -> (71.5, 2.5) construction
  line L28 (71.5, 2.5) -> (89.5, 2.5) construction
  point P0 (116, 54)
  point P1 (62.5, -4)
  point P2 (0, 6.5)
  dimension "d150" = 7.5
  dimension "d151" = 10.5
  dimension "d152" = 18
  dimension "d153" = 8
  dimension "d154" = 18
  dimension "d155" = 6
  dimension "d156" = 7
extrude "Extrusion14" [suppressed]
ref_plane "Work Plane5" through (-30.5, -47.5, 87.5) normal (0, 0, 1) x (-1, 0, 0)
revolve "Revolution4" [suppressed]
sketch "Sketch21" plane through (-30.5, -47.5, 87.5) normal (0, 0, 1) x (-1, 0, 0)
  line L0 (2.16, 0) -> (-0.36, 0)
  line L1 (1.8, 0) -> (1.8, -2.4896)
  line L2 (1.8, -2.4896) -> (0, -4)
  line L3 (0, -4) -> (0, 0)
  line L4 (0, -5) -> (0, 5)
  line L5 (0, -3) -> (0, 3) projected
  point P0 (-30.5, -47.5)
  point P1 (0, 0)
  dimension "d182" = 40
  dimension "d183" = 1.8
  dimension "d184" = 4
extrude "Extrusion15" [suppressed]
pattern_circular "Circular Pattern4" [suppressed]
thread "Thread4" size "M5x0.8" class "6g" standard "ANSI Metric M Profile" length 35
pattern_linear "Rectangular Pattern4" [suppressed]
sketch "Sketch15" plane through (-32.5, -47.5, -19.5) normal (0, 0, -1) x (1, 0, 0)
  line L0 (2, -3.9337) -> (2, 0.9663) construction
  line L1 (2, 0) -> (-48, 0)
  line L2 (2, 0) -> (2, -5)
  line L3 (2, -5) -> (1.5, -5)
  line L4 (1.5, -5) -> (-1, -2.5)
  line L5 (-1, -2.5) -> (-39.8229, -2.5)
  line L6 (-39.8229, -2.5) -> (-48, 0)
  line L7 (2, 3) -> (2, -3) projected
  point P0 (32.5, -47.5)
  point P1 (2, 0)
  dimension "d3" = 18
  dimension "d4" = 0
  dimension "d117" = 5
  dimension "d118" = 10
  dimension "d119" = 0.5
  dimension "d120" = 45
  dimension "d121" = 50
  dimension "d122" = 17
  dimension "d123" = 38.8229
sketch "Sketch20" plane through (-30.5, -47.5, 87.5) normal (0, 0, 1) x (-1, 0, 0)
  line L0 (0, 3.9337) -> (0, -0.9663) construction
  line L1 (0, 0) -> (50, 0)
  line L2 (0, 0) -> (0, 5)
  line L3 (0, 5) -> (0.5, 5)
  line L4 (0.5, 5) -> (3, 2.5)
  line L5 (3, 2.5) -> (41.8229, 2.5)
  line L6 (41.8229, 2.5) -> (50, 0)
  line L7 (0, -3) -> (0, 3)
  line L8 (0, -3) -> (0, 3) projected
  point P0 (-30.5, -47.5)
  point P1 (0, 0)
  point P2 (0, 0)
  dimension "d174" = 5
  dimension "d175" = 10
  dimension "d176" = 0.5
  dimension "d177" = 45
  dimension "d178" = 50
  dimension "d179" = 17
  dimension "d180" = 38.8229
properties part number "Adjustable universal mounting mechanism T615 Right"
